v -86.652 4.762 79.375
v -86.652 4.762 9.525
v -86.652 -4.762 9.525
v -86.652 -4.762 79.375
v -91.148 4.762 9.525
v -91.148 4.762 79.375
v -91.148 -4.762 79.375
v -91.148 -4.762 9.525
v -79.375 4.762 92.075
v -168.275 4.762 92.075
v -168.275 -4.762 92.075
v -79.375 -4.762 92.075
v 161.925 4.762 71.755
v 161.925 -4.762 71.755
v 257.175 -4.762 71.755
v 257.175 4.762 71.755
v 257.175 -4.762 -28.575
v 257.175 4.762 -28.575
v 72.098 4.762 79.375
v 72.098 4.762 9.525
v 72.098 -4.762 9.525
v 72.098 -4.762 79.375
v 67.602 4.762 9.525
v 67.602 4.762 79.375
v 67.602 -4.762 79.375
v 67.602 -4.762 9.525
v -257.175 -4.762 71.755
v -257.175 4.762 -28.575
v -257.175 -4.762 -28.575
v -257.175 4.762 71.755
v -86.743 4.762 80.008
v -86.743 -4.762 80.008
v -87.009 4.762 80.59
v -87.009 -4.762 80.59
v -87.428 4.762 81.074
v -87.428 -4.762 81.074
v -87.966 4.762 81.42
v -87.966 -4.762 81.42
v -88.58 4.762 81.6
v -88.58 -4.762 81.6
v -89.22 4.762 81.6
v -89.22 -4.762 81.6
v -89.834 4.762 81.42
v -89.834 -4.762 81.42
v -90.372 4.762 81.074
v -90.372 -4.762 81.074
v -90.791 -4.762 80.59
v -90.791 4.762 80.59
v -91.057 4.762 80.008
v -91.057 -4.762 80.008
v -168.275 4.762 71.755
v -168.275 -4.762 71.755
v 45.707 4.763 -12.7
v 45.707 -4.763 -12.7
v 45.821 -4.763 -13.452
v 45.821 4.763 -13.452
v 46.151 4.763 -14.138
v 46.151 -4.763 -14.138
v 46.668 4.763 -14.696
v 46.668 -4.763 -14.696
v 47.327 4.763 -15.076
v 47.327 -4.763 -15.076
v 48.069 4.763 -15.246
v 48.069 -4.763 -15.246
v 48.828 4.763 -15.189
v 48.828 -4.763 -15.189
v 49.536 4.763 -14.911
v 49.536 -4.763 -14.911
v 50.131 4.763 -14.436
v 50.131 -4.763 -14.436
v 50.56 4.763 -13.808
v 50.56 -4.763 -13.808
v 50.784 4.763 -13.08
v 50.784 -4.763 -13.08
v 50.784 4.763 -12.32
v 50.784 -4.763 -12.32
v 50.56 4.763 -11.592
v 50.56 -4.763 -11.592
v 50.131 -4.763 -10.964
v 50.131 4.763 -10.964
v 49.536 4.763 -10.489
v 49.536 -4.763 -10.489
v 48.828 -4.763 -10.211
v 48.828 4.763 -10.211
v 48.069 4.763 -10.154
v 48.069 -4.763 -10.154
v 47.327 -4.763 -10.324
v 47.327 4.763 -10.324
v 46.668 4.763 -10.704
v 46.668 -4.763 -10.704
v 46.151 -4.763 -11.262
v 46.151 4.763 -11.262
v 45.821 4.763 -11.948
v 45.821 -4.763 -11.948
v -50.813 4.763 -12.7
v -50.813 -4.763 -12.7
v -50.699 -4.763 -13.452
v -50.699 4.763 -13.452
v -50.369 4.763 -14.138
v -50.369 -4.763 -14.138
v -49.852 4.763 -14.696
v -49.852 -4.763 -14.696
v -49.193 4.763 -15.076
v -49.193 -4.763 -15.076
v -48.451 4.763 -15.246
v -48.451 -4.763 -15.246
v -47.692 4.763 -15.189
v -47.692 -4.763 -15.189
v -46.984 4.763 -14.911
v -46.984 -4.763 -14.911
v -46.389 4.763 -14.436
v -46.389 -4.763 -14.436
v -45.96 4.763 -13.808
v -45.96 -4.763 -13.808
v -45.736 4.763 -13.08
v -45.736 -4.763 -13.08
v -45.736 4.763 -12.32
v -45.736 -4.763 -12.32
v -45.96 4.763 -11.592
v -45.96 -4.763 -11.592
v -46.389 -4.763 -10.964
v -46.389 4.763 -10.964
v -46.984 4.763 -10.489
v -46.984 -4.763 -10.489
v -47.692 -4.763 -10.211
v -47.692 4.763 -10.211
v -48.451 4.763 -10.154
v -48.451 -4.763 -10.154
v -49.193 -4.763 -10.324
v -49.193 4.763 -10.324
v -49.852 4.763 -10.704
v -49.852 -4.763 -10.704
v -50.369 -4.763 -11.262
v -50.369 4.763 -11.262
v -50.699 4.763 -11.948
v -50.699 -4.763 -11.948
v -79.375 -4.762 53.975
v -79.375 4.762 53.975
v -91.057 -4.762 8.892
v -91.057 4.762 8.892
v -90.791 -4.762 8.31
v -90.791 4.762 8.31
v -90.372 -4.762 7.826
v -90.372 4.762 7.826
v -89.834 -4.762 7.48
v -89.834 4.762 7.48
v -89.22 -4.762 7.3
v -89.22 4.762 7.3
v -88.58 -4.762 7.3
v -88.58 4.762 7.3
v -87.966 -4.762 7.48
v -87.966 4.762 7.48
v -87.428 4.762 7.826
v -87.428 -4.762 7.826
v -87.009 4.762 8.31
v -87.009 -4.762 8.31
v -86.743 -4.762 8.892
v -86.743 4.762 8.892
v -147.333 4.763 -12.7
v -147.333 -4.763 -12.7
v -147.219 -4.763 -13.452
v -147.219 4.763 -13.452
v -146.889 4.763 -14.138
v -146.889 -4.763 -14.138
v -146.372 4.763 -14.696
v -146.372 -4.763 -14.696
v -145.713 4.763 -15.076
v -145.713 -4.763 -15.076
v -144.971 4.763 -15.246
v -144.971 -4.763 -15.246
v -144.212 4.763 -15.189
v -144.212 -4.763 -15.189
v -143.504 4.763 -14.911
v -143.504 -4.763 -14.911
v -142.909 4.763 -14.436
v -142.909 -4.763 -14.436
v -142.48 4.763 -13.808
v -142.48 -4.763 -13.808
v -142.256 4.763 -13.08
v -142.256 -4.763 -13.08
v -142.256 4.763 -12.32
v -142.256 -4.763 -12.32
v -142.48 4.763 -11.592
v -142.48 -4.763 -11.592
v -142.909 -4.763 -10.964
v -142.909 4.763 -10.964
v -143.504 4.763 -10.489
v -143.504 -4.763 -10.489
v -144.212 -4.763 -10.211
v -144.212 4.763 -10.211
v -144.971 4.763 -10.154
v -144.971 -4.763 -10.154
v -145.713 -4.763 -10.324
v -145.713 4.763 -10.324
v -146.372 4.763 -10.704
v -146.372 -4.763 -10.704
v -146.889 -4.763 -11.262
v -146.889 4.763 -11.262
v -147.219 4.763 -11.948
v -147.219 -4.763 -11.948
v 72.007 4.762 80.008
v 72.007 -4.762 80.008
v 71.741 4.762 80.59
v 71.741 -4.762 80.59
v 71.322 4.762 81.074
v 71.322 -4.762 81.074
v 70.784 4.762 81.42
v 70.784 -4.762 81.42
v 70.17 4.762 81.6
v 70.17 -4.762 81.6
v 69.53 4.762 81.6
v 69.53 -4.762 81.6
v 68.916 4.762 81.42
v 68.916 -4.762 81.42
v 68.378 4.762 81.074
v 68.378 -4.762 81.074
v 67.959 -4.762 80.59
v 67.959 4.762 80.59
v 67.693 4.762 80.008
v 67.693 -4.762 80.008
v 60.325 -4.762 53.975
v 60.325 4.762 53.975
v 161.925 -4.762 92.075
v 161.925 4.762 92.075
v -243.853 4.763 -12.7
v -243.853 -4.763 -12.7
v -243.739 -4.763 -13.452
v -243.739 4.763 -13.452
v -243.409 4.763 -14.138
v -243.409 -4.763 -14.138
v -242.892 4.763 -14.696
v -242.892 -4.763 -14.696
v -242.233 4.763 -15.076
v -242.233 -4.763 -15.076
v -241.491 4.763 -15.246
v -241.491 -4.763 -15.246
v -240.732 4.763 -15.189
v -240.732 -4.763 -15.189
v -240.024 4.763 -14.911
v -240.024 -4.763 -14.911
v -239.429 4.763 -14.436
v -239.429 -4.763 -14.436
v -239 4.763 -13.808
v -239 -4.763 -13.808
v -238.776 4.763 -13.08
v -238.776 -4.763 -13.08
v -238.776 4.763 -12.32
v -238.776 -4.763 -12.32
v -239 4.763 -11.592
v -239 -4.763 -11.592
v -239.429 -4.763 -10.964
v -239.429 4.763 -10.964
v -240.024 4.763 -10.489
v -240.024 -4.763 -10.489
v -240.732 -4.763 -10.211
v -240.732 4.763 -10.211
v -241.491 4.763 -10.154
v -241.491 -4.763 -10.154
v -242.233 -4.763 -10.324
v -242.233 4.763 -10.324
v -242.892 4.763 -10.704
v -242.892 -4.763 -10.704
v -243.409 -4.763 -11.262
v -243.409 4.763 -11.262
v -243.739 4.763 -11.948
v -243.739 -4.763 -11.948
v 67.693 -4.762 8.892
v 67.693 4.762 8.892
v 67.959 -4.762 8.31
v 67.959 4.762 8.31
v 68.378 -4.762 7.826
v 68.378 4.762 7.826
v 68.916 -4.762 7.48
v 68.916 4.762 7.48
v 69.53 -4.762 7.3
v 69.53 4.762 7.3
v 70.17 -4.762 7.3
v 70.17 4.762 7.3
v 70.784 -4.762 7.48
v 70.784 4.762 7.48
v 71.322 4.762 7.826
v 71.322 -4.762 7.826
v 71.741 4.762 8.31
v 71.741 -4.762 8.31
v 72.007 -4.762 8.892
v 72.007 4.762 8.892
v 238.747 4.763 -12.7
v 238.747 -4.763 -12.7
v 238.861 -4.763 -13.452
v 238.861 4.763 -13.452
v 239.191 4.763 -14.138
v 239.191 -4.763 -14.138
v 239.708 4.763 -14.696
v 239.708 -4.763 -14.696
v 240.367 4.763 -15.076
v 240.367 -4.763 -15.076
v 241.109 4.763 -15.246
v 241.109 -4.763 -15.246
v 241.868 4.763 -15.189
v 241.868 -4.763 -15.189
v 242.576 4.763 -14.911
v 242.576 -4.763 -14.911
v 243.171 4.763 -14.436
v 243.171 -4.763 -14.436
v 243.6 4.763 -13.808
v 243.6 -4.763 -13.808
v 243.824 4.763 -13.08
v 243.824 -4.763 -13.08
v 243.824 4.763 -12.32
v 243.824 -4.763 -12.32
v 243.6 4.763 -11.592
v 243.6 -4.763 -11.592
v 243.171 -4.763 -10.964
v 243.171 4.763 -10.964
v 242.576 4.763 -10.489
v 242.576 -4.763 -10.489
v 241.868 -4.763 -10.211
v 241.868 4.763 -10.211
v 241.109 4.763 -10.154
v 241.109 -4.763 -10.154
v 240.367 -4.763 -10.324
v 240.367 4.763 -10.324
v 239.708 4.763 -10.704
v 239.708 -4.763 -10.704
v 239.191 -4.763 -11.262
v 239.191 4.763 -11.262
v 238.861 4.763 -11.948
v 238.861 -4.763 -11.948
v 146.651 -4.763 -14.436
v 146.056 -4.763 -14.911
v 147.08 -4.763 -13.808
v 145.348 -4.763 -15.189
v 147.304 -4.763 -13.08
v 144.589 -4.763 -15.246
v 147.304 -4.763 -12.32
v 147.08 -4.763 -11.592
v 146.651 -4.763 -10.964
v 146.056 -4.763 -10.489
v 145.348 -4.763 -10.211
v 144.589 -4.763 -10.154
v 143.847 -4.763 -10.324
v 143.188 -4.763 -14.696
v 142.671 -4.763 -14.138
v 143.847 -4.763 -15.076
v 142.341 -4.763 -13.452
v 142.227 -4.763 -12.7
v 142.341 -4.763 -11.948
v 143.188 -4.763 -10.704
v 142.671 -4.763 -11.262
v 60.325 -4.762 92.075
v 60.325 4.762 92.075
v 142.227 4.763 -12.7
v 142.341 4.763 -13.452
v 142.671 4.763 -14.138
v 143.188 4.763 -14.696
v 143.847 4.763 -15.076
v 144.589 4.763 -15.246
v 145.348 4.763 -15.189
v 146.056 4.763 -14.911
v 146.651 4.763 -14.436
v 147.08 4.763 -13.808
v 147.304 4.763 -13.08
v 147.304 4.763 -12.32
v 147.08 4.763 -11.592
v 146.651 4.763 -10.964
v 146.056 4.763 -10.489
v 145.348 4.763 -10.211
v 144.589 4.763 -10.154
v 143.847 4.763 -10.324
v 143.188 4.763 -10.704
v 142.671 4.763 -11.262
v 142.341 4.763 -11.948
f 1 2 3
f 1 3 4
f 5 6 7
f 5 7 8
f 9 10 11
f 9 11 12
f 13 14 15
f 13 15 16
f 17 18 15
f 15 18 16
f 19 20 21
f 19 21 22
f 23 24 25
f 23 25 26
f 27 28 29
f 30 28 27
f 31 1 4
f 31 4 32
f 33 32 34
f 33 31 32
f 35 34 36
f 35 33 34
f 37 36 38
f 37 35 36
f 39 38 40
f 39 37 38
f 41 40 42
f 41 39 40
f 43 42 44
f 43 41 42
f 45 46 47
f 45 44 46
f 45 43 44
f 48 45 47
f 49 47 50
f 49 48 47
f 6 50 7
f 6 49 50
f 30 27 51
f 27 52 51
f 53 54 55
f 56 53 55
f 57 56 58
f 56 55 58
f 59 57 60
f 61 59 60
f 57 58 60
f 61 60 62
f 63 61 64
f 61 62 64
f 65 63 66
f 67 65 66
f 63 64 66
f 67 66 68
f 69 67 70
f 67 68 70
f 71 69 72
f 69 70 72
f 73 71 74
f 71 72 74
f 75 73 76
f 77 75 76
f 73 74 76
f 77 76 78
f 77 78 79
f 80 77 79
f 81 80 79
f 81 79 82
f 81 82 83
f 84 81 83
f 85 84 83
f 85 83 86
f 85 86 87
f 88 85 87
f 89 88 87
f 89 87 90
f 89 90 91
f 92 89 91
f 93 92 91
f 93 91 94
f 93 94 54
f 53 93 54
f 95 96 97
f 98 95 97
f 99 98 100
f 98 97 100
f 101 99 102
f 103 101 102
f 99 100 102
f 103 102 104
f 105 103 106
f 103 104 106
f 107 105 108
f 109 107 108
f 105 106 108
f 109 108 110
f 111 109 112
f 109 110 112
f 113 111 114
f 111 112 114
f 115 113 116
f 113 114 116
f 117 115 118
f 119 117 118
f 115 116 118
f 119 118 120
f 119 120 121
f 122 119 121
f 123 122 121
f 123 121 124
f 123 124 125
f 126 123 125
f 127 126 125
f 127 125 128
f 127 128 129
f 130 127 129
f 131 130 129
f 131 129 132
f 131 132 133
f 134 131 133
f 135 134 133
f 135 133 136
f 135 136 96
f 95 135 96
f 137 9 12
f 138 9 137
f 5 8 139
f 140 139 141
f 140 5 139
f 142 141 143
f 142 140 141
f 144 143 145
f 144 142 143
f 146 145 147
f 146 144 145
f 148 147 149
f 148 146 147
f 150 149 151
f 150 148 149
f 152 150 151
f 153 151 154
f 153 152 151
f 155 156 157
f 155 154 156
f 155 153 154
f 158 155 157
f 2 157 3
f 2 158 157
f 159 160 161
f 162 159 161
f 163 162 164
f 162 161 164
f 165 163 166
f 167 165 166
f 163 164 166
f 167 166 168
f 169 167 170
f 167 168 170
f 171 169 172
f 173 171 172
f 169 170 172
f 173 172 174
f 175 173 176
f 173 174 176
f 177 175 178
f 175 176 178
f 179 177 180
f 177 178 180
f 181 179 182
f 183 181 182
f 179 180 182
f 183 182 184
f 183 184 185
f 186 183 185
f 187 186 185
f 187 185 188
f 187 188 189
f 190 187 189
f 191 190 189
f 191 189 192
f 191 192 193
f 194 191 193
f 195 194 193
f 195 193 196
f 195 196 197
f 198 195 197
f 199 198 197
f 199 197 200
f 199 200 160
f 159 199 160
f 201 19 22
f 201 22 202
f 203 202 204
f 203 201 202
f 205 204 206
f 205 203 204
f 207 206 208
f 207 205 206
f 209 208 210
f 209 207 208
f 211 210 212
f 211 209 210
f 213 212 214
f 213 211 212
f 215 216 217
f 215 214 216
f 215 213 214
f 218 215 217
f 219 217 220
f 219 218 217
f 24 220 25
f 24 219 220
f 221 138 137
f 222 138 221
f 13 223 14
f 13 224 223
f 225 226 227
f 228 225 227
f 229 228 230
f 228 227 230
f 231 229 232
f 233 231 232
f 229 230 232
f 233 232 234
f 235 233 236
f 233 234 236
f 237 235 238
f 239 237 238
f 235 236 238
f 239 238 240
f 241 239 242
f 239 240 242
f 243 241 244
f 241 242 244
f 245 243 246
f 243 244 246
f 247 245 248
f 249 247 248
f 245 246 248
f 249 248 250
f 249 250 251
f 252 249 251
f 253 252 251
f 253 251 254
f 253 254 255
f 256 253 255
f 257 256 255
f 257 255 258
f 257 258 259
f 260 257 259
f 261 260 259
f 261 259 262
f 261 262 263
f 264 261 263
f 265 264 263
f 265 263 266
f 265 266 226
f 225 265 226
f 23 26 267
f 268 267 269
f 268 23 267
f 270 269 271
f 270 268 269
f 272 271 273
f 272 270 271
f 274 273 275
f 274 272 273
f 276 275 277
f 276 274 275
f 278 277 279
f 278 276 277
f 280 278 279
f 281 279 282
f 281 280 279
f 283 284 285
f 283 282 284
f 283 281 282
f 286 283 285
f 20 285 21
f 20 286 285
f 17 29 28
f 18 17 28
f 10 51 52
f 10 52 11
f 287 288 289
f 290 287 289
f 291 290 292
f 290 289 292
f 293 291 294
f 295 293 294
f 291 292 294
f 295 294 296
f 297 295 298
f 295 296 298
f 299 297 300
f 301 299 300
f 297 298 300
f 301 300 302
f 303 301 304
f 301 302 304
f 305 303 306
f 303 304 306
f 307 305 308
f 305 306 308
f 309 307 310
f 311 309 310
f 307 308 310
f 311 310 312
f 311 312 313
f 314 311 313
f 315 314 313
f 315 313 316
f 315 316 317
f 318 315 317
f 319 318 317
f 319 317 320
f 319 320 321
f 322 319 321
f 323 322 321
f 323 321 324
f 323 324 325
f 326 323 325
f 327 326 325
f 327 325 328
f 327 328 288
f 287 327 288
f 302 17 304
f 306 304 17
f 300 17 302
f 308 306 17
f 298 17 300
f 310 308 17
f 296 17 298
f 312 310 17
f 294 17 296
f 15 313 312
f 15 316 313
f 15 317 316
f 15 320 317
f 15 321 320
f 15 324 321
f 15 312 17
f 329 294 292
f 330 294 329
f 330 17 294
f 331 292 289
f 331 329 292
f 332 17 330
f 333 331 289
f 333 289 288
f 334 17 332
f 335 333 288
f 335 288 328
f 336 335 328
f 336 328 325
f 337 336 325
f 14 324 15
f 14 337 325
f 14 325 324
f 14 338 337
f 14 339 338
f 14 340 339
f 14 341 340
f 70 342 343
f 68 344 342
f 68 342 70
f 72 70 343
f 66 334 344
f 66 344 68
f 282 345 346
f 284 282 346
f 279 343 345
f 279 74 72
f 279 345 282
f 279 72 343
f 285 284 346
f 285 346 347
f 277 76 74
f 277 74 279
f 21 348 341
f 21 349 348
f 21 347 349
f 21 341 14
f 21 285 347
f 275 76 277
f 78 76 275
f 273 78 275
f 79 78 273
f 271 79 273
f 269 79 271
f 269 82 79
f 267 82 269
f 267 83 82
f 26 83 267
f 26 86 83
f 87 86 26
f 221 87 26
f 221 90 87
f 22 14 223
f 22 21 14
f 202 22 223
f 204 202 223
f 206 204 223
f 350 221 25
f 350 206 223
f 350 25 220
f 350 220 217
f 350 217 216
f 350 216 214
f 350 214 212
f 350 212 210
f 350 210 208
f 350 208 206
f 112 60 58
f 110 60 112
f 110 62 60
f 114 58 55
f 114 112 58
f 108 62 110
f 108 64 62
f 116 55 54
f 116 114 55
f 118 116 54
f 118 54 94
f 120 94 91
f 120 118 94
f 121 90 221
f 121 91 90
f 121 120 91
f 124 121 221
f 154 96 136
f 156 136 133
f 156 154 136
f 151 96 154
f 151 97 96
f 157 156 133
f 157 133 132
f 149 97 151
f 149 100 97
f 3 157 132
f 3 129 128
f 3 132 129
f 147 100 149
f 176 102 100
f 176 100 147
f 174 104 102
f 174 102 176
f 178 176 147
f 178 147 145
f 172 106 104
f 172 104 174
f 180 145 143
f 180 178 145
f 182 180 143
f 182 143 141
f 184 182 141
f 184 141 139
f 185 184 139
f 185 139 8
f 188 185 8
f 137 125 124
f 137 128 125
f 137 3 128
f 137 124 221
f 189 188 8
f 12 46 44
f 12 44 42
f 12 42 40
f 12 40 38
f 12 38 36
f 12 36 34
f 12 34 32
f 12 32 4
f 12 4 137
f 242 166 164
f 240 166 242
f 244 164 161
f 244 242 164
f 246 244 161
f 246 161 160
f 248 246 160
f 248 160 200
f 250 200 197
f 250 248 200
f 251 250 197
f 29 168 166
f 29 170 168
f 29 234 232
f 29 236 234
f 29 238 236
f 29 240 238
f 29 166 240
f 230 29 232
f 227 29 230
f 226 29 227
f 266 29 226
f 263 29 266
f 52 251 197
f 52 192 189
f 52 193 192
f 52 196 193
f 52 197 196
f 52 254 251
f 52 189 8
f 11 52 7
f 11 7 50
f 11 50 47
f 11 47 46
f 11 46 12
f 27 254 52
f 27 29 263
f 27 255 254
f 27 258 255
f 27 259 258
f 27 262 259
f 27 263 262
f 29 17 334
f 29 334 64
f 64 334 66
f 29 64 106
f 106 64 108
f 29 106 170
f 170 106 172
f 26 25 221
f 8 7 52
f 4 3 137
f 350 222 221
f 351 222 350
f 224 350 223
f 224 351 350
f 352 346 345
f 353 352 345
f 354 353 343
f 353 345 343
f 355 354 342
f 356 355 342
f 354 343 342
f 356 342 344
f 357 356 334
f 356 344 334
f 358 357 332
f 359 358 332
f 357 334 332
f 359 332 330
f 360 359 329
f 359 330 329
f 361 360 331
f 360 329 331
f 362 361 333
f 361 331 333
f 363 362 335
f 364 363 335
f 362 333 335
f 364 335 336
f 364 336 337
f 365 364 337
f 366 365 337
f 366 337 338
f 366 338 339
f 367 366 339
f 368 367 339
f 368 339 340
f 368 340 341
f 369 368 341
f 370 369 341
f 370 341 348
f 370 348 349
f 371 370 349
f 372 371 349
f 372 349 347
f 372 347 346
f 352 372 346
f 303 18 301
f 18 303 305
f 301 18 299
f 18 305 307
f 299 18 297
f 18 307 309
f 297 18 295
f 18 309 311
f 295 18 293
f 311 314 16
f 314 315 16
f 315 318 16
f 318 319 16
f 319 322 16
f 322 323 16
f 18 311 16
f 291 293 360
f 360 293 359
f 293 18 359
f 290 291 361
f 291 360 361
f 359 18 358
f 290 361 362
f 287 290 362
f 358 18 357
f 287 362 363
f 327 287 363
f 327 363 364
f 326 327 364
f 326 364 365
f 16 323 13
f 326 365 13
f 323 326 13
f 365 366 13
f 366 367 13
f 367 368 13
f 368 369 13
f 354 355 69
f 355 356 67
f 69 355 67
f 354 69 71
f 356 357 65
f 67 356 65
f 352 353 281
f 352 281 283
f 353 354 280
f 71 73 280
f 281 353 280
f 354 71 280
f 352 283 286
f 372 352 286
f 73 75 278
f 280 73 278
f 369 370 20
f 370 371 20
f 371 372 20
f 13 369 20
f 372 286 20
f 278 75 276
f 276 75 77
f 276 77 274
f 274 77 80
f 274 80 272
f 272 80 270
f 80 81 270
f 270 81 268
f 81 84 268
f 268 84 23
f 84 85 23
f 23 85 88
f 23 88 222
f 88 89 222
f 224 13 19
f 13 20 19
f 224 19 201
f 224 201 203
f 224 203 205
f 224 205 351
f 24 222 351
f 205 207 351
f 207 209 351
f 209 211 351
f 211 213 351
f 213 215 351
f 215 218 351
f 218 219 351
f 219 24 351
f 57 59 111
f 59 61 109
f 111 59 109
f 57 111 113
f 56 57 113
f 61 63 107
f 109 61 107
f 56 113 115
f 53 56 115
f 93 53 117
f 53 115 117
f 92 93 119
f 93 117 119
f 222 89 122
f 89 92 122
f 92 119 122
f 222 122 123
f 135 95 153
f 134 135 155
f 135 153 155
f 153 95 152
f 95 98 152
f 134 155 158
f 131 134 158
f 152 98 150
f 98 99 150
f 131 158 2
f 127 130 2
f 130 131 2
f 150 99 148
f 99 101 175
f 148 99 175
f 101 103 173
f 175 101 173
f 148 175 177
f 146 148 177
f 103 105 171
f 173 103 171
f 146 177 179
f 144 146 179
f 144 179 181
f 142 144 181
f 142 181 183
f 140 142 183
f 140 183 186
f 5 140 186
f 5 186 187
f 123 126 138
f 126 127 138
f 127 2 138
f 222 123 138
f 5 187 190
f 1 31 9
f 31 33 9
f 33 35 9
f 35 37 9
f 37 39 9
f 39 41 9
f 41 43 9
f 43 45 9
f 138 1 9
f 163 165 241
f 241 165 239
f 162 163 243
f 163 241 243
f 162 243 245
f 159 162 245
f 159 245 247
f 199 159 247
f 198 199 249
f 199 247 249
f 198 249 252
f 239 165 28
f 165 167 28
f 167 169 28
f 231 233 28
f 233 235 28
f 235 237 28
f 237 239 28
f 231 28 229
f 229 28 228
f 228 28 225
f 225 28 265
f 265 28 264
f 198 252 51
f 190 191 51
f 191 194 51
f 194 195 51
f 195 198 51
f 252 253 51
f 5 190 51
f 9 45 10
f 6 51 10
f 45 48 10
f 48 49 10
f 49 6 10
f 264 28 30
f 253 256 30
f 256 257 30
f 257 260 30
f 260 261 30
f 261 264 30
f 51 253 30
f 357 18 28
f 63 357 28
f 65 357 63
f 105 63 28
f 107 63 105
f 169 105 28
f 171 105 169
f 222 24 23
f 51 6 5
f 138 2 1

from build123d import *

# Parameters (mm, degrees)
SKETCH1_W              = 501.65
SKETCH1_H              = 57.15
BOSS_EXTRUDE1_DEPTH    = 4.7625
BOSS_EXTRUDE2_DEPTH    = 4.7625
SKETCH23_W             = 100.33
SKETCH23_H             = 9.525
BOSS_EXTRUDE3_DEPTH    = 6.35
F_10_CLEARANCE_HOLE2_D = 5.1054
LPATTERN1_COUNT        = 6
LPATTERN1_PITCH        = 96.52
CUT_EXTRUDE6_REACH     = 275.327


with BuildPart() as part:
    # Sketch1 → Boss-Extrude1 (new, symmetric)
    with BuildSketch(Plane(origin=(0, 0, 0), x_dir=(1, 0, 0), z_dir=(0, 1, 0))):
        Rectangle(SKETCH1_W, SKETCH1_H)
    extrude(amount=BOSS_EXTRUDE1_DEPTH, both=True)

    # Sketch2 → Boss-Extrude2 (add, symmetric)
    with BuildSketch(Plane(origin=(0, 0, 0), x_dir=(1, 0, 0), z_dir=(0, 1, 0))):
        Polygon((161.925, -92.075), (161.925, -71.755), (250.825, -71.755), (250.825, -28.575), (-250.825, -28.575), (-250.825, -71.755), (-168.275, -71.755), (-168.275, -92.075), (-79.375, -92.075), (-79.375, -53.975), (60.325, -53.975), (60.325, -92.075), align=None)
    extrude(amount=BOSS_EXTRUDE2_DEPTH, both=True)

    # Sketch23 → Boss-Extrude3 (add)
    with BuildSketch(Plane.ZY.offset(250.825)):
        with Locations((21.59, 0)):
            Rectangle(SKETCH23_W, SKETCH23_H)
    boss_extrude3 = extrude(amount=BOSS_EXTRUDE3_DEPTH)

    # Mirror1: Boss-Extrude3 across plane
    add(boss_extrude3.mirror(Plane(origin=(0, 0, 0), x_dir=(0, 0, 1), z_dir=(1, 0, 0))))

    # #10 Clearance Hole2 (through all)
    with Locations(Plane(origin=(0, 4.7625, 0), x_dir=(1, 0, 0), z_dir=(0, 1, 0))):
        with Locations((241.3, 12.7)):
            f_10_clearance_hole2 = Hole(F_10_CLEARANCE_HOLE2_D / 2)

    # LPattern1: #10 Clearance Hole2 ×6
    with Locations(*[(-i * LPATTERN1_PITCH, 0, 0) for i in range(1, LPATTERN1_COUNT)]):
        add(f_10_clearance_hole2, mode=Mode.SUBTRACT)

    # Sketch40 → Cut-Extrude6 (cut, up to next)
    with BuildSketch(Plane(origin=(0, 4.7625, 0), x_dir=(1, 0, 0), z_dir=(0, 1, 0)), mode=Mode.PRIVATE) as cut_extrude6_sk1:
        with BuildLine():
            Line((-91.1479, -79.375), (-91.1479, -9.525))
            ThreePointArc((-91.1479, -9.525), (-88.9, -7.2771), (-86.6521, -9.525))
            Line((-86.6521, -9.525), (-86.6521, -79.375))
            ThreePointArc((-86.6521, -79.375), (-88.9, -81.6229), (-91.1479, -79.375))
        make_face()
    cut_extrude6_tool1 = extrude(cut_extrude6_sk1.sketch, amount=-CUT_EXTRUDE6_REACH, mode=Mode.PRIVATE) & part.part
    # Sketch40 → Cut-Extrude6 (cut, up to next)
    with BuildSketch(Plane(origin=(0, 4.7625, 0), x_dir=(1, 0, 0), z_dir=(0, 1, 0)), mode=Mode.PRIVATE) as cut_extrude6_sk2:
        with BuildLine():
            Line((67.6021, -79.375), (67.6021, -9.525))
            ThreePointArc((67.6021, -9.525), (69.85, -7.2771), (72.0979, -9.525))
            Line((72.0979, -9.525), (72.0979, -79.375))
            ThreePointArc((72.0979, -79.375), (69.85, -81.6229), (67.6021, -79.375))
        make_face()
    cut_extrude6_tool2 = extrude(cut_extrude6_sk2.sketch, amount=-CUT_EXTRUDE6_REACH, mode=Mode.PRIVATE) & part.part
    add(cut_extrude6_tool1.solids().sort_by_distance((-88.9, 4.7625, 44.45))[0], mode=Mode.SUBTRACT)
    add(cut_extrude6_tool2.solids().sort_by_distance((69.85, 4.7625, 44.45))[0], mode=Mode.SUBTRACT)


solid = part.part
